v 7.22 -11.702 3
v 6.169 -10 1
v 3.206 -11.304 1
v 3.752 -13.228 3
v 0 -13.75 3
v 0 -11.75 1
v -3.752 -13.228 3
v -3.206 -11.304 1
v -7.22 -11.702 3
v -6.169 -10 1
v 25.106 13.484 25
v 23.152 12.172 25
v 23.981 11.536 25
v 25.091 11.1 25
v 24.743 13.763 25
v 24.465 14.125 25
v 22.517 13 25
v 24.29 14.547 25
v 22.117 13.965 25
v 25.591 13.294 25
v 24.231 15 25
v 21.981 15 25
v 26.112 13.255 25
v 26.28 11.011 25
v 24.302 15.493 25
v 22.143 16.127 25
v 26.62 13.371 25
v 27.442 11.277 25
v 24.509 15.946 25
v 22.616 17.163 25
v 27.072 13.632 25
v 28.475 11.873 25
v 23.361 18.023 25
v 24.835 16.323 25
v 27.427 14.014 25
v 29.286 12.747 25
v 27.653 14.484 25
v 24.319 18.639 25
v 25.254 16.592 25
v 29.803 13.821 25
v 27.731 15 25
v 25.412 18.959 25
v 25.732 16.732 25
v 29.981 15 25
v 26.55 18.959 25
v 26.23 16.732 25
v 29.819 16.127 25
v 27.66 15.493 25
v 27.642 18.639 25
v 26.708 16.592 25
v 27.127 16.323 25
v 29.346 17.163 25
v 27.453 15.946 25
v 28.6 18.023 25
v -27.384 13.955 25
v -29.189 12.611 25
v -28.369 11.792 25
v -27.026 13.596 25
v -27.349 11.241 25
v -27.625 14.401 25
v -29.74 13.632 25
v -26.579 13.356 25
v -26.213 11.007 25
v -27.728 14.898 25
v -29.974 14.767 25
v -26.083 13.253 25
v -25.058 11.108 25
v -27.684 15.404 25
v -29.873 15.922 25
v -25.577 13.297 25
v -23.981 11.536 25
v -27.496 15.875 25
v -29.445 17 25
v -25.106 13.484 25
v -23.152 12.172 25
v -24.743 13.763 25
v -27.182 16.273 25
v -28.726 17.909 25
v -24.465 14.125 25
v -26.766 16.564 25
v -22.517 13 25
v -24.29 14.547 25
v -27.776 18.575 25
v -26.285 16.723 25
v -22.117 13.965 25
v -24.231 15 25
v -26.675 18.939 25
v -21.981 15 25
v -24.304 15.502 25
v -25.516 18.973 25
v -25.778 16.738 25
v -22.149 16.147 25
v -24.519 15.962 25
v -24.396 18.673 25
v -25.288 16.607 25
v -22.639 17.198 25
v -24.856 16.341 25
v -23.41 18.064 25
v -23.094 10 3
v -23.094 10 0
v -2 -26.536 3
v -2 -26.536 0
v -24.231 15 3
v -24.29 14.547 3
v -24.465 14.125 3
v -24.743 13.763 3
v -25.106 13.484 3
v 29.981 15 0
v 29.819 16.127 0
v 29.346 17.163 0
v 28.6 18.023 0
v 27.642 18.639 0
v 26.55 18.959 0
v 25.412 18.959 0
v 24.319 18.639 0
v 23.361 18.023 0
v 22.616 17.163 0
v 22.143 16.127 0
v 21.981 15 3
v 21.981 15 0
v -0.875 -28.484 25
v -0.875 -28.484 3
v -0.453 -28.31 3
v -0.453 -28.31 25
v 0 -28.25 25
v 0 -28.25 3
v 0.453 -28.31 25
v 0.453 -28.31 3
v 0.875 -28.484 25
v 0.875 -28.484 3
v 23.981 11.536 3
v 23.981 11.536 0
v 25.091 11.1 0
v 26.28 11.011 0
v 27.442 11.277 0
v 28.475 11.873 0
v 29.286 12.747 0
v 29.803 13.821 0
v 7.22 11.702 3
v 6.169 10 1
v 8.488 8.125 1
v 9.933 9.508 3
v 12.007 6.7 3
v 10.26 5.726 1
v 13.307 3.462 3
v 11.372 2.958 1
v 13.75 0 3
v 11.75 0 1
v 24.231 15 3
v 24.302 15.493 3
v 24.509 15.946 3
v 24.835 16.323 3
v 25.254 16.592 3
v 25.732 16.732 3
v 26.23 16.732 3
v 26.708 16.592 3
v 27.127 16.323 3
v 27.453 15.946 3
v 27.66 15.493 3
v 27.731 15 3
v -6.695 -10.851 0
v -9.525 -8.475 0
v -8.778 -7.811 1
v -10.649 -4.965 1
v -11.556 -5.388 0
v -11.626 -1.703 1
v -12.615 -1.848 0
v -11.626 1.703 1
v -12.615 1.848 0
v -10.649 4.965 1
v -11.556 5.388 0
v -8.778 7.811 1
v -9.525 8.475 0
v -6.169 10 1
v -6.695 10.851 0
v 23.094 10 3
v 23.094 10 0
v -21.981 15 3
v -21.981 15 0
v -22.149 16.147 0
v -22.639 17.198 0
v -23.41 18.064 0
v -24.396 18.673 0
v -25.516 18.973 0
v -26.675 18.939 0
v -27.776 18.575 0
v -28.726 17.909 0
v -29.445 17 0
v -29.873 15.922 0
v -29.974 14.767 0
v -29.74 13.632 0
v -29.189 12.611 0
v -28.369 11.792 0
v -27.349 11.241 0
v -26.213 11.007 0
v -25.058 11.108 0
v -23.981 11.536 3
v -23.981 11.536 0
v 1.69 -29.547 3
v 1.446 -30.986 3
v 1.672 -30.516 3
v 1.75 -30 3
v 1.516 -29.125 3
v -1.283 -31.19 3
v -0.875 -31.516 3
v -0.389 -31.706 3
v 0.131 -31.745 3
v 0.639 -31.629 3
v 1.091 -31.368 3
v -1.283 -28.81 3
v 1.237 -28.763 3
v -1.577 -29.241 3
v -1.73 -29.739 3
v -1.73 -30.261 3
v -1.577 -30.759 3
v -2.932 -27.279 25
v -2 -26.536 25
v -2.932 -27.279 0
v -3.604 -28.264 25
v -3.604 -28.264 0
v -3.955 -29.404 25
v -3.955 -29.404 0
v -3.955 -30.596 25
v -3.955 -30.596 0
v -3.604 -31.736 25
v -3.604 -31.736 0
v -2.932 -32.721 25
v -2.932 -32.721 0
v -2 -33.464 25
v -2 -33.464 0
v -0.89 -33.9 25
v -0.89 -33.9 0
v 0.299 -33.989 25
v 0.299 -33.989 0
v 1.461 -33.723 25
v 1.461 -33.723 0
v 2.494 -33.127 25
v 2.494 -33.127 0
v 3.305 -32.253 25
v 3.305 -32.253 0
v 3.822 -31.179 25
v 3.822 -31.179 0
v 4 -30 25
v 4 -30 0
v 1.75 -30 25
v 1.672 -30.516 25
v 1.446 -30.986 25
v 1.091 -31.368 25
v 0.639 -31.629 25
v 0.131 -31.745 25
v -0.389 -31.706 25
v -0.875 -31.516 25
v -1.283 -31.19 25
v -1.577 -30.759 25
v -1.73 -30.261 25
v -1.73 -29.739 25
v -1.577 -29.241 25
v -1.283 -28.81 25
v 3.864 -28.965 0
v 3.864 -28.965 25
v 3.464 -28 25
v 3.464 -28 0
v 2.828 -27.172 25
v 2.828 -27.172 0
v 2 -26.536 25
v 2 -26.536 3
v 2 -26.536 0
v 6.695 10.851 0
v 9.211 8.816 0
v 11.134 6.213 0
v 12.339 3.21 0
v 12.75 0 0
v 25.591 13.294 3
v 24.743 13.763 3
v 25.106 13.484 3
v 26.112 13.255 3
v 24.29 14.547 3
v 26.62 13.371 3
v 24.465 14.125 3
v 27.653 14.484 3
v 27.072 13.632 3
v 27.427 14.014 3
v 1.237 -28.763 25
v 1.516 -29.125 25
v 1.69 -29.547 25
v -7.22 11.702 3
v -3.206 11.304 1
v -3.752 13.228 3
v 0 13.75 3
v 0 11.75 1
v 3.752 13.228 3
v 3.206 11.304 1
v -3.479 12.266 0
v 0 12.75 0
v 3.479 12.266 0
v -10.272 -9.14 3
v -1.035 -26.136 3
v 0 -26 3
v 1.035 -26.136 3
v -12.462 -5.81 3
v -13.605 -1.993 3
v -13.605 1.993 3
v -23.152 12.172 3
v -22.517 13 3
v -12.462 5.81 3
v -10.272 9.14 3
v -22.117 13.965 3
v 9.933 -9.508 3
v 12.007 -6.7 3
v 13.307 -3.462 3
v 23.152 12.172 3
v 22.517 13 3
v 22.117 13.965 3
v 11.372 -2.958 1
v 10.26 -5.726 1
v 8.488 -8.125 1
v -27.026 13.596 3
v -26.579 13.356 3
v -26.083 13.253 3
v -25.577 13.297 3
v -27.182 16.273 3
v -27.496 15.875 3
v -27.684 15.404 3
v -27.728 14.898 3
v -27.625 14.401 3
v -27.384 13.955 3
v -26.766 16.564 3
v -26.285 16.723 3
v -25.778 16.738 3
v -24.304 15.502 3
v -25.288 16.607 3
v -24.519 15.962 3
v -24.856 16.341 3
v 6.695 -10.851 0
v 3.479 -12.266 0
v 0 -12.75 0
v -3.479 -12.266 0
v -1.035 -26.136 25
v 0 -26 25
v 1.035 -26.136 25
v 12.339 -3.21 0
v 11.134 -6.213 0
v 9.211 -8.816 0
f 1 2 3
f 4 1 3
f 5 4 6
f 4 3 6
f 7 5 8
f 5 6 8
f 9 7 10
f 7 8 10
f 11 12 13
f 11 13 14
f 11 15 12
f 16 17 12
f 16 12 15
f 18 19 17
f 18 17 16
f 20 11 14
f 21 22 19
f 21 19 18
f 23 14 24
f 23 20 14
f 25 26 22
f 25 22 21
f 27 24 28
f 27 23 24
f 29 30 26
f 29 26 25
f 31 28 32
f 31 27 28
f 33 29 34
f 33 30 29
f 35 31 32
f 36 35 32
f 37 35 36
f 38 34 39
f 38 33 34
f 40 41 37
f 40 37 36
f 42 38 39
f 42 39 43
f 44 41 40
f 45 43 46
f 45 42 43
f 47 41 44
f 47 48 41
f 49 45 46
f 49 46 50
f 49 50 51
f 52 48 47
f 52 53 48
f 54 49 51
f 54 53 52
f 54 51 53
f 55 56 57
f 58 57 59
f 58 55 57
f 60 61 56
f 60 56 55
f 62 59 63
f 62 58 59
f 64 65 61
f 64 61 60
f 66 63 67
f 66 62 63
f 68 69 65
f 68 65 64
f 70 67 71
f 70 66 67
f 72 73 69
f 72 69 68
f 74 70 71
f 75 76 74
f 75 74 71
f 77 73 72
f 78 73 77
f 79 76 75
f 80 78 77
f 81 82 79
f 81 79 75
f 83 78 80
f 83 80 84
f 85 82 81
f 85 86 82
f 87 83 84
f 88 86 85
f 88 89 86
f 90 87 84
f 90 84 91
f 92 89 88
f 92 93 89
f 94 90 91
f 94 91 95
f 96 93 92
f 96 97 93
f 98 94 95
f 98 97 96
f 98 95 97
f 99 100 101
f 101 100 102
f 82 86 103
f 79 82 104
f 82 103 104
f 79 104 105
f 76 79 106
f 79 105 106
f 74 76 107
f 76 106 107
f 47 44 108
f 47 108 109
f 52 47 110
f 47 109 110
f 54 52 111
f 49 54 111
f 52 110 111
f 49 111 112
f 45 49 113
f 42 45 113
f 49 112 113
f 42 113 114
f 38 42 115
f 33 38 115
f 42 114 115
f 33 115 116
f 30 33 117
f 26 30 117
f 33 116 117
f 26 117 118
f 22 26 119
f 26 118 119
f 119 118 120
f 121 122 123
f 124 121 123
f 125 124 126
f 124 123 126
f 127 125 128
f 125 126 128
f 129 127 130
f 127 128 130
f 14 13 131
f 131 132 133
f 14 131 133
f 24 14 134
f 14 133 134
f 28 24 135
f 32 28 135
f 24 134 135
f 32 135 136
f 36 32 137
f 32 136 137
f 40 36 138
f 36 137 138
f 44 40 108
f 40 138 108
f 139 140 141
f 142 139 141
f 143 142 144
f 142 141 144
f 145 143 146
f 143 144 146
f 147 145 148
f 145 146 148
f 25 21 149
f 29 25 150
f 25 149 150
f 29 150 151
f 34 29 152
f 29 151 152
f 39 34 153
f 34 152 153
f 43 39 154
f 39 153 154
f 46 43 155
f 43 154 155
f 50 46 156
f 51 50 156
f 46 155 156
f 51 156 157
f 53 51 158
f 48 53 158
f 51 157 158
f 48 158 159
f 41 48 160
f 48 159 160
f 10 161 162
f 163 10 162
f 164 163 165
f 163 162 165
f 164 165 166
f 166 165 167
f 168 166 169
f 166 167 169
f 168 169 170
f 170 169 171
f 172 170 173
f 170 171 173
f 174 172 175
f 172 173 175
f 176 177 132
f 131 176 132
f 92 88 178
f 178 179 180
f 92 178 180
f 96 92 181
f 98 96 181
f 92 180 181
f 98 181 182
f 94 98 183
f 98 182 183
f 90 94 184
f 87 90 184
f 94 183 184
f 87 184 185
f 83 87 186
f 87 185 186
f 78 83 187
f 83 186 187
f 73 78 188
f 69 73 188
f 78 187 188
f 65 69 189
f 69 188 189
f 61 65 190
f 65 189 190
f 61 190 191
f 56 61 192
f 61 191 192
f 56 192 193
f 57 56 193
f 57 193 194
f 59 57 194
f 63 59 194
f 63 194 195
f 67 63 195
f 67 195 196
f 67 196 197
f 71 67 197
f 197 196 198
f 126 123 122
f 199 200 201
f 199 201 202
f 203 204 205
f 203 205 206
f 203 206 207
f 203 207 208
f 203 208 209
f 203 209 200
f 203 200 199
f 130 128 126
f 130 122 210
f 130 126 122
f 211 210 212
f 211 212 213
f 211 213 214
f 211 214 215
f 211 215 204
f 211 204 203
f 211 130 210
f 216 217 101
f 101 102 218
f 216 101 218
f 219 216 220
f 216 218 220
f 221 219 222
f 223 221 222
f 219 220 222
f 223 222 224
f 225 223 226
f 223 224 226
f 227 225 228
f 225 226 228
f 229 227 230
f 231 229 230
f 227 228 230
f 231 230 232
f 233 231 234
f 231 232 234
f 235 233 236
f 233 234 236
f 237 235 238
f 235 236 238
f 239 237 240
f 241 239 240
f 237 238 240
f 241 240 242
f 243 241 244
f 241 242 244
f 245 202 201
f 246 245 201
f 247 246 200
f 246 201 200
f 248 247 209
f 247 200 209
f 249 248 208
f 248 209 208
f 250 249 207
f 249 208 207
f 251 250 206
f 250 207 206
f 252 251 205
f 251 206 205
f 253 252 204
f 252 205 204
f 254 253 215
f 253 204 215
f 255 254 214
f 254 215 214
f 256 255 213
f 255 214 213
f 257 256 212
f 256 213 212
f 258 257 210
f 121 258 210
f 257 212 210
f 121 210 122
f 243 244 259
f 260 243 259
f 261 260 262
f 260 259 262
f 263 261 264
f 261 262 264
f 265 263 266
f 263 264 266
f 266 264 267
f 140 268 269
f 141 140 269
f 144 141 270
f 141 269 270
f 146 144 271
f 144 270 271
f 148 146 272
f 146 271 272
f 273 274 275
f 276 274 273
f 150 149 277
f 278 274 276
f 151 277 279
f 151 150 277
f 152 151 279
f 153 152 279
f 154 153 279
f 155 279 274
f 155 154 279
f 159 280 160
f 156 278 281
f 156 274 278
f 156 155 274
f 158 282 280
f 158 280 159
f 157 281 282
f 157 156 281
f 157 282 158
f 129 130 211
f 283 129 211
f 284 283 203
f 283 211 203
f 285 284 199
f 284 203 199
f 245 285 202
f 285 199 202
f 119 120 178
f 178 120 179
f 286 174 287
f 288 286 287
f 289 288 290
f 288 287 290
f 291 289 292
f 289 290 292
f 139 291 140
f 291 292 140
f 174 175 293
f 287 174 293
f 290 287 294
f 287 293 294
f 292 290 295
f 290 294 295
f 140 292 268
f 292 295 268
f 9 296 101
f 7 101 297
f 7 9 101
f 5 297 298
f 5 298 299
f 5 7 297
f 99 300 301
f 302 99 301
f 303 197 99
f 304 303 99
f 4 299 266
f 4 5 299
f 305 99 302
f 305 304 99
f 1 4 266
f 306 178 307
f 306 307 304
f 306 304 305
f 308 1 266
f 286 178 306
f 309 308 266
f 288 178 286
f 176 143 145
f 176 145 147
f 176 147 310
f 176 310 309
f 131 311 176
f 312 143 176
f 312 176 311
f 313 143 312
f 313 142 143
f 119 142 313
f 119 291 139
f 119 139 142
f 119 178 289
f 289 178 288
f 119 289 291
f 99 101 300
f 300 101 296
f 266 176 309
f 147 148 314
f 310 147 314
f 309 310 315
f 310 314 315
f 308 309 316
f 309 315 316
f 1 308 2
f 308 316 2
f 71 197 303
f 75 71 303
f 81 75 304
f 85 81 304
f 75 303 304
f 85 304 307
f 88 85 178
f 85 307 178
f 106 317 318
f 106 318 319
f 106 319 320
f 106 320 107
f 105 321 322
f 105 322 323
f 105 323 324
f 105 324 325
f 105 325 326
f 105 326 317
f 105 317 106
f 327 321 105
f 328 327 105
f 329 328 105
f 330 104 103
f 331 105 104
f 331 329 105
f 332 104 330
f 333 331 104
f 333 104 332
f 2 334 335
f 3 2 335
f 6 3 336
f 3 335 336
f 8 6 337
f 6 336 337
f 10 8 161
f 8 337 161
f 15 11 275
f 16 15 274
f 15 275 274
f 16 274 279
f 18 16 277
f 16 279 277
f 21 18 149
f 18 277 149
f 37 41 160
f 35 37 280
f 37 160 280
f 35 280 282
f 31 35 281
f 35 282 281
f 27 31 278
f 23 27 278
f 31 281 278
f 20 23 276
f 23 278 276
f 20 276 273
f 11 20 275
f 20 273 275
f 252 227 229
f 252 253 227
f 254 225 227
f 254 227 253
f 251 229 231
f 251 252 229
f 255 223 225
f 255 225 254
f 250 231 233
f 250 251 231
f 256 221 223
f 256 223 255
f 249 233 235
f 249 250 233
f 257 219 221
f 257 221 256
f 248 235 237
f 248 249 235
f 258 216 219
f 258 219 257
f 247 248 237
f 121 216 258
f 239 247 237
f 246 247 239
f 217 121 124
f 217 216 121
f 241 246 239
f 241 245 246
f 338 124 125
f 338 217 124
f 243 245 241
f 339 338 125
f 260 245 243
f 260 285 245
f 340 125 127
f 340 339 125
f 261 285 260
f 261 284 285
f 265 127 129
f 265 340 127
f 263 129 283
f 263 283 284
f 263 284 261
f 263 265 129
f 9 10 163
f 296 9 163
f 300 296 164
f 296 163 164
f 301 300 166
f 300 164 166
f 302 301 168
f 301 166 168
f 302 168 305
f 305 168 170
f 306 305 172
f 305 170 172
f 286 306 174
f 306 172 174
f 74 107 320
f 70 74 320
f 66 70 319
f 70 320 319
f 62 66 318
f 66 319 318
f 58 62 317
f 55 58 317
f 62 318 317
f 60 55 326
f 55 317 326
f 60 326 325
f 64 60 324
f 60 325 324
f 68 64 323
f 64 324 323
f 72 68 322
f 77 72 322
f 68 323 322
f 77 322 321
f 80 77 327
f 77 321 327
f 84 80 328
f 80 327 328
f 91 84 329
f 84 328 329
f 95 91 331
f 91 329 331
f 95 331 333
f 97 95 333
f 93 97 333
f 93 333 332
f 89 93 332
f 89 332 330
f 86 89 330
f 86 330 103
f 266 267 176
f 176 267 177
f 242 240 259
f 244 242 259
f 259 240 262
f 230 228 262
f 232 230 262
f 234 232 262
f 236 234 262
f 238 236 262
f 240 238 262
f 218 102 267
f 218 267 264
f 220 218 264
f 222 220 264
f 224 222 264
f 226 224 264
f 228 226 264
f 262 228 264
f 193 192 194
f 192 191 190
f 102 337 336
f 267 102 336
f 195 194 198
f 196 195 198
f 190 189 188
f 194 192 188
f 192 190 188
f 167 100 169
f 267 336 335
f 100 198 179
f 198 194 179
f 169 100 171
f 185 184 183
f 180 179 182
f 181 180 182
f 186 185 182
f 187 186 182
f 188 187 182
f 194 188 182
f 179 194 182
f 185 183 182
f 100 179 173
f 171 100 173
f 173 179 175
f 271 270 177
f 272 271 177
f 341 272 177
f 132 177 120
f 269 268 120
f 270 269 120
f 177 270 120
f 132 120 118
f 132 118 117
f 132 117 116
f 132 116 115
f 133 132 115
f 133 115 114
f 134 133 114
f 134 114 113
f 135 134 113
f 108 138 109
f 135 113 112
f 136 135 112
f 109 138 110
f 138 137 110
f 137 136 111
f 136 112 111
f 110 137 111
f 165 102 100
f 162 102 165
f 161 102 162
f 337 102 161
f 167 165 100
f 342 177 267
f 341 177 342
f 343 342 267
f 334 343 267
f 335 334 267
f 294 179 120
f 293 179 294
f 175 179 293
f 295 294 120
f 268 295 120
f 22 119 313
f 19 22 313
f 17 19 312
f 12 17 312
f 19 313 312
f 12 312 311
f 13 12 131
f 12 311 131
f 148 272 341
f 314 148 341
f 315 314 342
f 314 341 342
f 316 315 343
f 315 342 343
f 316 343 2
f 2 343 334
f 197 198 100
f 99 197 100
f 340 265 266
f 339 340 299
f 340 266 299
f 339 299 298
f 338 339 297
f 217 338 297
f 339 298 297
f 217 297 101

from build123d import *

# Parameters (mm, degrees)
F1_DEPTH = 3
F2_DEPTH = 25
F3_SIZE  = 1
F4_SIZE  = 1.99999


# Not quite as in the source:
# - a fillet or chamfer is up to 0.001 mm smaller than in the source, because OpenCascade refuses the exact size


with BuildPart() as f1:
    # F0 (on Top) → F1 (new body)
    with BuildSketch(Plane.XY):
        with BuildLine():
            ThreePointArc((-6.1694813396, 10), (0, 11.75), (6.1694813396, 10))
            Line((6.1694813396, 10), (23.0940107676, 10))
            Line((23.0940107676, 10), (23.9807621135, 11.5358983849))
            ThreePointArc((23.9807621135, 11.5358983849), (22.5166604984, 13), (21.9807621135, 15))
            Line((21.9807621135, 15), (-21.9807621135, 15))
            ThreePointArc((-21.9807621135, 15), (-22.5166604984, 13), (-23.9807621135, 11.5358983849))
            Line((-23.9807621135, 11.5358983849), (-23.0940107676, 10))
            Line((-23.0940107676, 10), (-6.1694813396, 10))
        make_face()
        with BuildLine():
            ThreePointArc((-6.1694813396, -10), (-11.75, 0), (-6.1694813396, 10))
            Line((-6.1694813396, 10), (-23.0940107676, 10))
            Line((-23.0940107676, 10), (-11.5470053838, -10))
            Line((-11.5470053838, -10), (-6.1694813396, -10))
        make_face()
        with BuildLine():
            Line((11.5470053838, -10), (6.1694813396, -10))
            ThreePointArc((6.1694813396, -10), (0, -11.75), (-6.1694813396, -10))
            Line((-6.1694813396, -10), (-11.5470053838, -10))
            Line((-11.5470053838, -10), (-2, -26.5358983849))
            ThreePointArc((-2, -26.5358983849), (0, -26), (2, -26.5358983849))
            Line((2, -26.5358983849), (11.5470053838, -10))
        make_face()
        with BuildLine():
            ThreePointArc((6.1694813396, 10), (10.2604557828, 5.725866496), (11.75, 0))
            ThreePointArc((11.75, 0), (10.2604557828, -5.725866496), (6.1694813396, -10))
            Line((6.1694813396, -10), (11.5470053838, -10))
            Line((11.5470053838, -10), (23.0940107676, 10))
            Line((23.0940107676, 10), (6.1694813396, 10))
        make_face()
    extrude(amount=F1_DEPTH)



with BuildPart() as f1b:
    # F0 (on Top) → F1, piece 2 (new body)
    with BuildSketch(Plane.XY):
        with BuildLine():
            ThreePointArc((1.75, -30), (1.5155444566, -29.125), (0.875, -28.4844555434))
            Line((0.875, -28.4844555434), (0, -30))
            Line((0, -30), (-0.875, -28.4844555434))
            ThreePointArc((-0.875, -28.4844555434), (-0.875, -31.5155444566), (1.75, -30))
        make_face()
        with BuildLine():
            Line((0, -30), (0.875, -28.4844555434))
            ThreePointArc((0.875, -28.4844555434), (0, -28.25), (-0.875, -28.4844555434))
            Line((-0.875, -28.4844555434), (0, -30))
        make_face()
    extrude(amount=F1_DEPTH)


with BuildPart() as f1c:
    # F0 (on Top) → F1, piece 3 (new body)
    with BuildSketch(Plane.XY):
        with BuildLine():
            ThreePointArc((24.2307621135, 15), (24.4652176569, 14.125), (25.1057621135, 13.4844555434))
            Line((25.1057621135, 13.4844555434), (25.9807621135, 15))
            Line((25.9807621135, 15), (24.2307621135, 15))
        make_face()
        with BuildLine():
            Line((25.9807621135, 15), (25.1057621135, 13.4844555434))
            ThreePointArc((25.1057621135, 13.4844555434), (26.8557621135, 13.4844555434), (27.7307621135, 15))
            ThreePointArc((27.7307621135, 15), (25.9807621135, 16.75), (24.2307621135, 15))
            Line((24.2307621135, 15), (25.9807621135, 15))
        make_face()
    extrude(amount=F1_DEPTH)


with BuildPart() as f1d:
    # F0 (on Top) → F1, piece 4 (new body)
    with BuildSketch(Plane.XY):
        with BuildLine():
            Line((-25.9807621135, 15), (-25.1057621135, 13.4844555434))
            ThreePointArc((-25.1057621135, 13.4844555434), (-24.4652176569, 14.125), (-24.2307621135, 15))
            Line((-24.2307621135, 15), (-25.9807621135, 15))
        make_face()
        with BuildLine():
            ThreePointArc((-24.2307621135, 15), (-27.4963065702, 15.875), (-25.1057621135, 13.4844555434))
            Line((-25.1057621135, 13.4844555434), (-25.9807621135, 15))
            Line((-25.9807621135, 15), (-24.2307621135, 15))
        make_face()
    extrude(amount=F1_DEPTH)


with BuildPart() as f1_1:
    add(f1.part)

    add(f1b.part)  # F2 merges F1b

    add(f1c.part)  # F2 merges F1c

    add(f1d.part)  # F2 merges F1d
    # F0 (on Top) → F2 (join)
    with BuildSketch(Plane.XY):
        with BuildLine():
            Line((-25.1057621135, 13.4844555434), (-23.9807621135, 11.5358983849))
            ThreePointArc((-23.9807621135, 11.5358983849), (-22.5166604984, 13), (-21.9807621135, 15))
            Line((-21.9807621135, 15), (-24.2307621135, 15))
            ThreePointArc((-24.2307621135, 15), (-24.4652176569, 14.125), (-25.1057621135, 13.4844555434))
        make_face()
        with BuildLine():
            ThreePointArc((-21.9807621135, 15), (-29.4448637287, 17), (-23.9807621135, 11.5358983849))
            Line((-23.9807621135, 11.5358983849), (-25.1057621135, 13.4844555434))
            ThreePointArc((-25.1057621135, 13.4844555434), (-27.4963065702, 15.875), (-24.2307621135, 15))
            Line((-24.2307621135, 15), (-21.9807621135, 15))
        make_face()
        with BuildLine():
            ThreePointArc((21.9807621135, 15), (22.5166604984, 13), (23.9807621135, 11.5358983849))
            Line((23.9807621135, 11.5358983849), (25.1057621135, 13.4844555434))
            ThreePointArc((25.1057621135, 13.4844555434), (24.4652176569, 14.125), (24.2307621135, 15))
            Line((24.2307621135, 15), (21.9807621135, 15))
        make_face()
        with BuildLine():
            Line((25.1057621135, 13.4844555434), (23.9807621135, 11.5358983849))
            ThreePointArc((23.9807621135, 11.5358983849), (27.9807621135, 11.5358983849), (29.9807621135, 15))
            ThreePointArc((29.9807621135, 15), (25.9807621135, 19), (21.9807621135, 15))
            Line((21.9807621135, 15), (24.2307621135, 15))
            ThreePointArc((24.2307621135, 15), (25.9807621135, 16.75), (27.7307621135, 15))
            ThreePointArc((27.7307621135, 15), (26.8557621135, 13.4844555434), (25.1057621135, 13.4844555434))
        make_face()
        with BuildLine():
            Line((0.875, -28.4844555434), (2, -26.5358983849))
            ThreePointArc((2, -26.5358983849), (0, -26), (-2, -26.5358983849))
            Line((-2, -26.5358983849), (-0.875, -28.4844555434))
            ThreePointArc((-0.875, -28.4844555434), (0, -28.25), (0.875, -28.4844555434))
        make_face()
        with BuildLine():
            ThreePointArc((4, -30), (3.4641016151, -28), (2, -26.5358983849))
            Line((2, -26.5358983849), (0.875, -28.4844555434))
            ThreePointArc((0.875, -28.4844555434), (1.5155444566, -29.125), (1.75, -30))
            ThreePointArc((1.75, -30), (-0.875, -31.5155444566), (-0.875, -28.4844555434))
            Line((-0.875, -28.4844555434), (-2, -26.5358983849))
            ThreePointArc((-2, -26.5358983849), (-2, -33.4641016151), (4, -30))
        make_face()
    extrude(amount=F2_DEPTH)

    # F3
    f3_edges = [f1_1.edges().sort_by_distance(p)[0] for p in [
        (-6.169481, -10, 0),
    ]]
    chamfer(f3_edges, length=F3_SIZE)

    # F4 (size 2 in the source; OpenCascade refuses exactly that, so slightly less here)
    f4_edges = [f1_1.edges().sort_by_distance(p)[0] for p in [
        (-6.169481, -10, 3),
    ]]
    chamfer(f4_edges, length=F4_SIZE)


solid = f1_1.part
